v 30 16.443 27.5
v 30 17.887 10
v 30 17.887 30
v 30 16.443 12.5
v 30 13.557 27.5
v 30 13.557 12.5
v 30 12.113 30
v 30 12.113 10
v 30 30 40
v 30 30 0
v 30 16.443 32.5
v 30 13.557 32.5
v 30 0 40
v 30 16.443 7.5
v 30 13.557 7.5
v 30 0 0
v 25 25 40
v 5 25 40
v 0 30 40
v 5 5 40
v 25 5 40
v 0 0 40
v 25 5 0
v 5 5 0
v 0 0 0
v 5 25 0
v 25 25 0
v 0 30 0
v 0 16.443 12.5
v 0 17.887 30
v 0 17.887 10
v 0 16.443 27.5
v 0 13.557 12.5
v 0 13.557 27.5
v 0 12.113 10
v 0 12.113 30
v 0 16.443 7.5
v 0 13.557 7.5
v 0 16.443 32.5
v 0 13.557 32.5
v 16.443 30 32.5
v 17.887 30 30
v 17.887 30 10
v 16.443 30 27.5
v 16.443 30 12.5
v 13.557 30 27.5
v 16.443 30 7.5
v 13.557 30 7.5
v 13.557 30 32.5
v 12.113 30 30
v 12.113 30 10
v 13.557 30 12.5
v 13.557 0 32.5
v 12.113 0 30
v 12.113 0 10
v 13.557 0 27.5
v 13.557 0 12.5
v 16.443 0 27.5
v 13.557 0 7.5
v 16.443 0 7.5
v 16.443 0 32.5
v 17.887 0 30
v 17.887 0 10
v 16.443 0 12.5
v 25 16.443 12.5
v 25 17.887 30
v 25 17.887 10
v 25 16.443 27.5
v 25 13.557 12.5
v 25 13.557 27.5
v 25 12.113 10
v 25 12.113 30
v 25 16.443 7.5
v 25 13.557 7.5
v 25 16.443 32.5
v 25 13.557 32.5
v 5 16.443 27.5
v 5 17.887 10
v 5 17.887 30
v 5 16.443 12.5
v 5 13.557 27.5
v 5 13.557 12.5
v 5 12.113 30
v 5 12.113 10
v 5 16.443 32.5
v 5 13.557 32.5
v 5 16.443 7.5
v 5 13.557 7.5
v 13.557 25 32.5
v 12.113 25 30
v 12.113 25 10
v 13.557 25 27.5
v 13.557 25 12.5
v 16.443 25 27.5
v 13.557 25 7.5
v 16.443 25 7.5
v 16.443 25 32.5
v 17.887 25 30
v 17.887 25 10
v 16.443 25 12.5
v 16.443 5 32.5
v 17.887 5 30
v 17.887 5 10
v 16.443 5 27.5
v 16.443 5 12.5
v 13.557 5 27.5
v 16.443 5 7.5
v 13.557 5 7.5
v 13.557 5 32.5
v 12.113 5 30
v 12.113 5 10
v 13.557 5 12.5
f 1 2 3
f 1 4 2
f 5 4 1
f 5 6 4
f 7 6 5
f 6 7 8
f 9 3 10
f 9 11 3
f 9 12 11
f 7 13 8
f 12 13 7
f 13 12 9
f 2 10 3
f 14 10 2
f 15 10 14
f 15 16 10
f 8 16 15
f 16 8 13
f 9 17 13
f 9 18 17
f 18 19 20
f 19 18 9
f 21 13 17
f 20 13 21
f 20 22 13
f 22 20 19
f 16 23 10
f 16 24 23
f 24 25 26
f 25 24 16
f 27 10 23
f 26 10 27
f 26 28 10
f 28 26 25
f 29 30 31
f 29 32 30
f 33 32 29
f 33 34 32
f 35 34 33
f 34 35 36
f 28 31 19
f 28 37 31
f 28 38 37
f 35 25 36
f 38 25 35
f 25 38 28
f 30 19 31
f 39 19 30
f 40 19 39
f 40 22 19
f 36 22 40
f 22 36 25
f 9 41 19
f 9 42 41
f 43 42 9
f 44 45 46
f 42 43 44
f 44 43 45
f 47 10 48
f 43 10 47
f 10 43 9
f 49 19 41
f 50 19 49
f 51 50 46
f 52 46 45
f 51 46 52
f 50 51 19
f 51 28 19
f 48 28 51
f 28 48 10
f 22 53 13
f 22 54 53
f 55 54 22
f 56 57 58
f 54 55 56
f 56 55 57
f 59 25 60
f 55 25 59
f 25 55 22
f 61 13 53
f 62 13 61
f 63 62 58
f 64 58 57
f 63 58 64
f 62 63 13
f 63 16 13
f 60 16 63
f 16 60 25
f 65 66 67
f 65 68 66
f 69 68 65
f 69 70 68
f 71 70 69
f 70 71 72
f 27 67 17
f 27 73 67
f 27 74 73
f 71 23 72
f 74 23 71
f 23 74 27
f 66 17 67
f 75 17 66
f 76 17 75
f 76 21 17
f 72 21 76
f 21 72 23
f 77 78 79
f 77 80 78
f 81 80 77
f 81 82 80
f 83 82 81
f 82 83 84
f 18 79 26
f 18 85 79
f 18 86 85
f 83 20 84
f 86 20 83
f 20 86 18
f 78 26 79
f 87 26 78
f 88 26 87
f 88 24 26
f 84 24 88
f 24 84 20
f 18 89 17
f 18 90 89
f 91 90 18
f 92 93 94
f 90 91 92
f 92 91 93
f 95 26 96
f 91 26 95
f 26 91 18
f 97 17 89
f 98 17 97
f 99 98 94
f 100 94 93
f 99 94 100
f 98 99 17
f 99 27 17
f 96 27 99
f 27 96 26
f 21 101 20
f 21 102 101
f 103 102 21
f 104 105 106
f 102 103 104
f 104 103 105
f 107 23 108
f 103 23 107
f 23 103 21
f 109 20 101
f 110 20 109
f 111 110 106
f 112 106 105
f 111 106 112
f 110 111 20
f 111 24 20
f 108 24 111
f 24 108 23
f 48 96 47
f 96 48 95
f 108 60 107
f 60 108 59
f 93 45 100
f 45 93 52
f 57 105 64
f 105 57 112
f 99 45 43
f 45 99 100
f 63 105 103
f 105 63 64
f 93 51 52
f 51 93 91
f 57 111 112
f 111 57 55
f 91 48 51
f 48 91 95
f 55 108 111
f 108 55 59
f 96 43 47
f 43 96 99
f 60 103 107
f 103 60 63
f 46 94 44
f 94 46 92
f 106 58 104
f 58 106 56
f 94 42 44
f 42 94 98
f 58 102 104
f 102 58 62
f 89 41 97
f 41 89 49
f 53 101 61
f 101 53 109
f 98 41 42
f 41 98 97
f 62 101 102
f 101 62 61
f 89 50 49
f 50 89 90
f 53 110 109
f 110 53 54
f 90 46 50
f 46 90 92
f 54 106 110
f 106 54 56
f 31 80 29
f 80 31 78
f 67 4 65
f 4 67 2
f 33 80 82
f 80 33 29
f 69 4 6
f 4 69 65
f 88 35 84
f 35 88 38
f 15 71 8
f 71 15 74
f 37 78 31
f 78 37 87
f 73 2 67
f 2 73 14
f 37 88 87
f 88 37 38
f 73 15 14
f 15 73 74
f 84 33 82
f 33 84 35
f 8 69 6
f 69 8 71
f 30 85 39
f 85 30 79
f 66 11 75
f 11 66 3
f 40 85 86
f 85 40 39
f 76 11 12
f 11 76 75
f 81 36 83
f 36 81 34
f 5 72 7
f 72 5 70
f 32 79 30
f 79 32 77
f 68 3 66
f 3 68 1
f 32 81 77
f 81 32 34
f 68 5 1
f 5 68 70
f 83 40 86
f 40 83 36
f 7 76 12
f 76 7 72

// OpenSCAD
// file: vars.scad
// Variables used throughout design.
// Yes, these could use some commenting.
// (c) 2014, Christopher "ScribbleJ" Jansen
huge=500;

printer_w = 400;
printer_l = 400;
printer_h = 400;

bearing_w = 7;
bearing_d = 22;
bearing_r = bearing_d/2;
bearing_hole_d = 8;
bearing_hole_r = bearing_hole_d/2;


misc_bolt_d = 3.2;
misc_bolt_r = misc_bolt_d/2;
misc_nut_r  = misc_bolt_d;
misc_bolt_pitch = 0.5;
misc_bolthead_d = misc_bolt_d*2;
misc_bolthead_r = misc_bolthead_d/2;

retainer_shell_thick = 0.5;
retainer_shell_sep   = 0.25;
//retainer_lip_thick   = 1;
retainer_lip_thick   = 2;
retainer_inner_width = 1;

belt_w    = 6;
belt_thick= 2;
belt_sep  = retainer_lip_thick*2 + 2;

calc_retainer_h  = retainer_lip_thick*2 + belt_w;
calc_retainer_ir = bearing_r + retainer_shell_thick*2 + retainer_shell_sep;
calc_retainer_or = calc_retainer_ir + belt_thick;
calc_retainer_b_off = retainer_lip_thick - (bearing_w-belt_w)/2;

tslot_w = 20;
tslot_bolt_d = 5;
tslot_bolt_r = tslot_bolt_d/2;
tslot_bolt_l = 4;
tslot_bolthead_d = 10;
tslot_bolthead_r = tslot_bolthead_d/2;


corner_thick = 5;
corner_length = tslot_w*3;

rod_d=8;
rod_r=rod_d/2;

bushing_d=15;
bushing_r=bushing_d/2;
bushing_l=10;
bushing_flange_r = bushing_r+3;
bushing_flange_w = 1;
bushing_material_thick = 5;

x_rod_sep = 50;
x_carriage_l = 50;
x_mount_sep_x = x_carriage_l - misc_bolthead_r*2*2 - misc_bolt_r*2;
x_mount_offset = bushing_r + misc_bolt_r * 2;
belt_above_x = bushing_r+misc_nut_r*2;
belt_clamp_w = 7;
x_rod_past_bearing = 20;

//belt_above_y = belt_above_x + x_rod_sep/2;
//y_above_x = belt_above_x-belt_above_y;
belt_above_y = 45;
y_above_x = belt_above_x-belt_above_y;




bearing_mount_base = corner_thick;
bearing_mount_extra = 2;
belt_above_bearing_mount = bearing_mount_base + bearing_mount_extra + retainer_lip_thick;
bearing_mount_support_tweak = 30;

y_bearing_offset = bushing_r+bushing_material_thick-calc_retainer_ir;

y_bearing_sep_y = calc_retainer_ir*2+belt_thick;
y_bearing_sep_z = belt_w+belt_sep;
bearing_bolt_r  = 4;
bearing_bolt_pitch = 1.25;
bearing_bolt_holder_thick = 4;
y_carriage_from_tslot = 2;

y_carriage_len = 50;

motor_w = 42.3;
motor_h = motor_w;
motor_bolt_sep = 31.0;
motor_bolt_r   = 1.5;
motor_pulley_d = 10;
motor_pulley_r = motor_pulley_d/2;
motor_pulley_h = 5.3;
motor_flange_d = 23;
motor_flange_r = motor_flange_d/2;
motor_corner_extra_hole_pos = tslot_bolt_r+3;

calc_corner_from_y_rod = x_rod_past_bearing+corner_thick+y_carriage_from_tslot+tslot_w;
calc_corner_above_x = belt_above_x - belt_above_bearing_mount + bearing_mount_base;

calc_motor1_above_x  = belt_above_x - motor_pulley_h;
calc_motor2_above_x  = belt_above_x - motor_pulley_h + belt_w + belt_sep;
calc_motor_from_y_rod = -bushing_r - bushing_material_thick + bearing_bolt_holder_thick + bearing_bolt_r + calc_retainer_or + motor_pulley_r;

motor_bracket_thick = 12;
motor_bracket_wide = (motor_w - motor_flange_d) / 2;
motor_bracket_len  = motor_w;
motor_bolt_offset  = (motor_w - motor_bolt_sep) / 2;

z_rod_sep = 150;
z_motor_off = motor_h - tslot_w - corner_thick;

laser_mat_thick = 4.75;
laser_mat_margin = laser_mat_thick;
bed_mount_sep   = 209;
bed_from_z      = 60;
bed_box_r       = 25;
bed_box_h       = 50;
z_ends_sep = printer_l - tslot_w*2 - corner_thick*2 - motor_w;
platform_l      =  laser_mat_margin*2 + laser_mat_thick*2 + bed_box_r*2 + z_ends_sep;
platform_w      = bed_mount_sep + misc_bolt_r*2 + laser_mat_margin*2;
z_leadscrew_passthrough_r = 12/2;
leadscrew_bolt_offset = 22/2;
leadscrew_bolt_r = 3.2/2;
laser_bushing_fudge = 0.1;


lm8uu_d=15;
lm8uu_r=lm8uu_d/2;
lm8uu_bolt_r=5/2;
lm8uu_nut_r=10/2;

arduino_width=60;
// file: common.scad
// Common functions used in various places throughout.
// (c) 2014, Christopher "ScribbleJ" Jansen
include <vars.scad>

// Reduce radius of holes intended to hold bolts by threads.
// 0.86603 * p = nominal depth of threads.  1/3-1/2 of that is about right.
function smallhole(r,p) = r - ((p*0.86603)/3);

// Polyhole derived from Nophead's Polyhole work: http://hydraraptor.blogspot.com/2011/02/polyholes.html
module polyhole(r,h,v=6,a=0)
{
  rotate([0,0,a]) cylinder( h = h, r = r  / cos( 180 / v ), $fn = v );
}
// 2D version of Polyhole
module polycircle(r,v=6,a=0)
{
  rotate([0,0,a]) circle(r = r  / cos( 180 / v ), $fn = v );
}
// Cutout for bolthole
module bolt(bolt_r = misc_bolt_r,bolthead_r = misc_bolthead_r,bolt_len = huge,v=6,a=0)
{
  translate([0,0,-bolt_len]) polyhole(r=bolt_r,h=bolt_len+1,v=v,a=a);
  polyhole(r=bolthead_r,h=huge,v=v,a=a);
}
// 2D ring
module ring(inner=5,outer=10,v=32)
{
  difference()
  {
    circle(r=outer);
    polycircle(r=inner,v=v);
  }
} 
// 2D Rounded square
module roundsquare(dim=[50,50],r=5)
{
  translate([0,r]) square([dim[0], dim[1] - r*2]);
  translate([r,0]) square([dim[0] - r*2, dim[1]]);
  for(x=[r,dim[0]-r])
  for(y=[r,dim[1]-r])
    translate([x,y]) circle(r=r);
}
// Lasercutting Tabs
module maketabs(l=100,w=5,num=10)
{
  tablength=l/(num * 2);
  for(x=[tablength/2:tablength*2:l])
    translate([x,0]) square([tablength,w]);
}
// Support for printing bearing mount
module support(l=bearing_mount_base+bearing_mount_extra+y_bearing_sep_z+calc_retainer_b_off,w=bearing_hole_d * tan(180/6) *2,extra=0,extra_l=0)
{
  translate([-w/2,0,-l]) 
  {
    difference()
    {
      rotate([45,0,0]) cube([w,huge/2,huge/2]);
      translate([-huge/2,0,0]) cube([huge,huge,huge]);
      translate([-huge/2,-huge/2,l]) cube([huge,huge,huge]);
    }
    translate([0,-extra,-extra_l/2]) cube([w,extra,extra_l]);
  }

}
// main file
// T-Slot coupler
// Because I'm stupid and cut two rods too short.
// Print none.  Unless you are stupid, too.
// (c) 2014, Christopher "ScribbleJ" Jansen
include <common.scad>

extender();

module extender()
{
  difference()
  {
    cube([tslot_w+corner_thick*2,tslot_w+corner_thick*2,tslot_w*2]);

    translate([corner_thick,corner_thick,-1]) cube([tslot_w,tslot_w,huge]);
    translate([corner_thick+tslot_w/2,0,tslot_w/2]) rotate([90,0,0]) translate([0,0,-huge/2]) polyhole(r=tslot_bolt_r,h=huge);
    translate([corner_thick+tslot_w/2,0,tslot_w*1.5]) rotate([90,0,0]) translate([0,0,-huge/2]) polyhole(r=tslot_bolt_r,h=huge);

    translate([0,corner_thick+tslot_w/2,tslot_w/2]) rotate([0,90,0]) translate([0,0,-huge/2]) polyhole(r=tslot_bolt_r,h=huge,a=360/12);
    translate([0,corner_thick+tslot_w/2,tslot_w*1.5]) rotate([0,90,0]) translate([0,0,-huge/2]) polyhole(r=tslot_bolt_r,h=huge,a=360/12);
  }
}
